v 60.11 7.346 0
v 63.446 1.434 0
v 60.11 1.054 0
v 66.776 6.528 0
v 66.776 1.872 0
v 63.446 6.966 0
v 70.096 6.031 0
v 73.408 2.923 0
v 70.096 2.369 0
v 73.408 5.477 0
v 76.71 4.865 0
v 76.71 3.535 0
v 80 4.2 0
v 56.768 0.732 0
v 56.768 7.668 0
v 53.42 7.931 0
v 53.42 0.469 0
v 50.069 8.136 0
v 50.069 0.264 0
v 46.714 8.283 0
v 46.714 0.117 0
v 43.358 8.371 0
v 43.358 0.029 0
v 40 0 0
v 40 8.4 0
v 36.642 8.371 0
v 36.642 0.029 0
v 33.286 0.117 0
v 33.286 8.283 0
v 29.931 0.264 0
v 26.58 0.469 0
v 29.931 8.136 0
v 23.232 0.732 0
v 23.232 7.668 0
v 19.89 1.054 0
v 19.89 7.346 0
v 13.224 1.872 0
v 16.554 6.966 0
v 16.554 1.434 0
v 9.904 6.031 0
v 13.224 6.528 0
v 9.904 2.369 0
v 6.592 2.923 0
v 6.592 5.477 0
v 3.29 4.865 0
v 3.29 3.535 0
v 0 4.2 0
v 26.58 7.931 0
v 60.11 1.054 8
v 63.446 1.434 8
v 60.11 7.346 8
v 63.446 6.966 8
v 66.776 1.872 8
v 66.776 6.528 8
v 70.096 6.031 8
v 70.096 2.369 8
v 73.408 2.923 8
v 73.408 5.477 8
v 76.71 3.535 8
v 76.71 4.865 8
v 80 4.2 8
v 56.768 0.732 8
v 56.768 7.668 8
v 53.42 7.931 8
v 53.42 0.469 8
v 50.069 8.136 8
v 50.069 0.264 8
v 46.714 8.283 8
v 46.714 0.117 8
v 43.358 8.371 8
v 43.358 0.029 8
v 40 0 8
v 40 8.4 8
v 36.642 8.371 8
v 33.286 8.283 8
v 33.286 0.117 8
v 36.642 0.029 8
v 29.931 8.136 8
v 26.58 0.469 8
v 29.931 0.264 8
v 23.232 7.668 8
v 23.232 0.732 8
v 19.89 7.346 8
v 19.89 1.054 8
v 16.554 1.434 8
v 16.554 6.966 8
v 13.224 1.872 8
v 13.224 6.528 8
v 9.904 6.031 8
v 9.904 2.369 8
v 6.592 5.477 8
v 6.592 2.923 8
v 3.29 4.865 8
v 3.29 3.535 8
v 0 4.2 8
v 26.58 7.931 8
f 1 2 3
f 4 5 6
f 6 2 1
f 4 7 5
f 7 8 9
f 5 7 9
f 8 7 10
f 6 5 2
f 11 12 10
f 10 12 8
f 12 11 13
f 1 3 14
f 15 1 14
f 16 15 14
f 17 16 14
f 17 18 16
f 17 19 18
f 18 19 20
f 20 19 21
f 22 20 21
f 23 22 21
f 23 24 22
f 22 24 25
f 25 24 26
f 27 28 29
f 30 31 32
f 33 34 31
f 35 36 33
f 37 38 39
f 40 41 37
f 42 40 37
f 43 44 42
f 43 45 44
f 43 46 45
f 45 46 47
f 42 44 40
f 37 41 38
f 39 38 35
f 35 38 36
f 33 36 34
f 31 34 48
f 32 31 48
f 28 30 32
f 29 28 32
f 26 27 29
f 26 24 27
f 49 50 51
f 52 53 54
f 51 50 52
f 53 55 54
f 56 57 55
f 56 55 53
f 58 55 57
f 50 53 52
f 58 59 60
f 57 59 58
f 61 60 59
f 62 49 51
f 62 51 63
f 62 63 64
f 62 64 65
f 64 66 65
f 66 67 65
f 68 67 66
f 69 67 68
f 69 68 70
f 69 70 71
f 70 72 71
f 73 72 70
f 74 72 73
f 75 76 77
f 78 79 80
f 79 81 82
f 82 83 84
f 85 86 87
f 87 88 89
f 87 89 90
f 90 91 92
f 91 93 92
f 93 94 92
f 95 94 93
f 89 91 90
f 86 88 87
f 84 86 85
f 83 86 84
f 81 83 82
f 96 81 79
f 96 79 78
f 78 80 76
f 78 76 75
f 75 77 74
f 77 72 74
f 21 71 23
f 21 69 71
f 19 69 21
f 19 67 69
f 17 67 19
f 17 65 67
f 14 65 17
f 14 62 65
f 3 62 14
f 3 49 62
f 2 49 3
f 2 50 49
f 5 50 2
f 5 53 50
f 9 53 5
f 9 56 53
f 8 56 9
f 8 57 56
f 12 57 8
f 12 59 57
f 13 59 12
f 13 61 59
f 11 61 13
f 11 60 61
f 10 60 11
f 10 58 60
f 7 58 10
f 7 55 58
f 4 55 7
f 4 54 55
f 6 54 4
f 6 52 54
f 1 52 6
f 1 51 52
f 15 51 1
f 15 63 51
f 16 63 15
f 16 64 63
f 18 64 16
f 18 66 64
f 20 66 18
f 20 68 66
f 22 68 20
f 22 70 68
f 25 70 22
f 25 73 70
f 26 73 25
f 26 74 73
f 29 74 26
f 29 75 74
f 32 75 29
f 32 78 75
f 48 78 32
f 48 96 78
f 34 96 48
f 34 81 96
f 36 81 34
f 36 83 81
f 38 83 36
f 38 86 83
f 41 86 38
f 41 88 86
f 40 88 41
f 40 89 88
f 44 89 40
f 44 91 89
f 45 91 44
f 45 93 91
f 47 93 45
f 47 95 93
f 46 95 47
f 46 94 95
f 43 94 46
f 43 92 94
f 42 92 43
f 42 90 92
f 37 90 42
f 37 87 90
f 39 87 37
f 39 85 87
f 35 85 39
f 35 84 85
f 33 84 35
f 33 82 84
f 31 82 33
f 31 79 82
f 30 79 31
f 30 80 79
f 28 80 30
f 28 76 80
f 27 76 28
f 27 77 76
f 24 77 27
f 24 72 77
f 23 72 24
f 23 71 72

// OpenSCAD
$fn = 32;

// ----------------------------------------------------------------------
// Arc profile plate: lens, 48 points
// ----------------------------------------------------------------------

// --- parameters (mm) ---
lens_chord = 80;          // chord length of the lens, X
arc_r = 192.39;           // radius of both arcs
arc_angle = 24;           // angle of each arc, degrees
sagitta = 4.2;            // bulge of each arc (half the lens height)
arc_step = 1;             // sampling step of the arcs, degrees
plate_t = 8;              // plate thickness, Z

bbox_y = 2 * sagitta;  // full lens height

profile = [[80, 4.2], [76.71, 4.865], [73.408, 5.477], [70.096, 6.031], [66.776, 6.528], [63.446, 6.966], [60.11, 7.346], [56.768, 7.668], [53.42, 7.931], [50.069, 8.136], [46.714, 8.283], [43.358, 8.371], [40, 8.4], [36.642, 8.371], [33.286, 8.283], [29.931, 8.136], [26.58, 7.931], [23.232, 7.668], [19.89, 7.346], [16.554, 6.966], [13.224, 6.528], [9.904, 6.031], [6.592, 5.477], [3.29, 4.865], [0, 4.2], [3.29, 3.535], [6.592, 2.923], [9.904, 2.369], [13.224, 1.872], [16.554, 1.434], [19.89, 1.054], [23.232, 0.732], [26.58, 0.469], [29.931, 0.264], [33.286, 0.117], [36.642, 0.029], [40, 0], [43.358, 0.029], [46.714, 0.117], [50.069, 0.264], [53.42, 0.469], [56.768, 0.732], [60.11, 1.054], [63.446, 1.434], [66.776, 1.872], [70.096, 2.369], [73.408, 2.923], [76.71, 3.535]];  // primary outline, 48 points, counter clockwise

// --- the one profile operation ---
linear_extrude(height = plate_t) polygon(points = profile);
